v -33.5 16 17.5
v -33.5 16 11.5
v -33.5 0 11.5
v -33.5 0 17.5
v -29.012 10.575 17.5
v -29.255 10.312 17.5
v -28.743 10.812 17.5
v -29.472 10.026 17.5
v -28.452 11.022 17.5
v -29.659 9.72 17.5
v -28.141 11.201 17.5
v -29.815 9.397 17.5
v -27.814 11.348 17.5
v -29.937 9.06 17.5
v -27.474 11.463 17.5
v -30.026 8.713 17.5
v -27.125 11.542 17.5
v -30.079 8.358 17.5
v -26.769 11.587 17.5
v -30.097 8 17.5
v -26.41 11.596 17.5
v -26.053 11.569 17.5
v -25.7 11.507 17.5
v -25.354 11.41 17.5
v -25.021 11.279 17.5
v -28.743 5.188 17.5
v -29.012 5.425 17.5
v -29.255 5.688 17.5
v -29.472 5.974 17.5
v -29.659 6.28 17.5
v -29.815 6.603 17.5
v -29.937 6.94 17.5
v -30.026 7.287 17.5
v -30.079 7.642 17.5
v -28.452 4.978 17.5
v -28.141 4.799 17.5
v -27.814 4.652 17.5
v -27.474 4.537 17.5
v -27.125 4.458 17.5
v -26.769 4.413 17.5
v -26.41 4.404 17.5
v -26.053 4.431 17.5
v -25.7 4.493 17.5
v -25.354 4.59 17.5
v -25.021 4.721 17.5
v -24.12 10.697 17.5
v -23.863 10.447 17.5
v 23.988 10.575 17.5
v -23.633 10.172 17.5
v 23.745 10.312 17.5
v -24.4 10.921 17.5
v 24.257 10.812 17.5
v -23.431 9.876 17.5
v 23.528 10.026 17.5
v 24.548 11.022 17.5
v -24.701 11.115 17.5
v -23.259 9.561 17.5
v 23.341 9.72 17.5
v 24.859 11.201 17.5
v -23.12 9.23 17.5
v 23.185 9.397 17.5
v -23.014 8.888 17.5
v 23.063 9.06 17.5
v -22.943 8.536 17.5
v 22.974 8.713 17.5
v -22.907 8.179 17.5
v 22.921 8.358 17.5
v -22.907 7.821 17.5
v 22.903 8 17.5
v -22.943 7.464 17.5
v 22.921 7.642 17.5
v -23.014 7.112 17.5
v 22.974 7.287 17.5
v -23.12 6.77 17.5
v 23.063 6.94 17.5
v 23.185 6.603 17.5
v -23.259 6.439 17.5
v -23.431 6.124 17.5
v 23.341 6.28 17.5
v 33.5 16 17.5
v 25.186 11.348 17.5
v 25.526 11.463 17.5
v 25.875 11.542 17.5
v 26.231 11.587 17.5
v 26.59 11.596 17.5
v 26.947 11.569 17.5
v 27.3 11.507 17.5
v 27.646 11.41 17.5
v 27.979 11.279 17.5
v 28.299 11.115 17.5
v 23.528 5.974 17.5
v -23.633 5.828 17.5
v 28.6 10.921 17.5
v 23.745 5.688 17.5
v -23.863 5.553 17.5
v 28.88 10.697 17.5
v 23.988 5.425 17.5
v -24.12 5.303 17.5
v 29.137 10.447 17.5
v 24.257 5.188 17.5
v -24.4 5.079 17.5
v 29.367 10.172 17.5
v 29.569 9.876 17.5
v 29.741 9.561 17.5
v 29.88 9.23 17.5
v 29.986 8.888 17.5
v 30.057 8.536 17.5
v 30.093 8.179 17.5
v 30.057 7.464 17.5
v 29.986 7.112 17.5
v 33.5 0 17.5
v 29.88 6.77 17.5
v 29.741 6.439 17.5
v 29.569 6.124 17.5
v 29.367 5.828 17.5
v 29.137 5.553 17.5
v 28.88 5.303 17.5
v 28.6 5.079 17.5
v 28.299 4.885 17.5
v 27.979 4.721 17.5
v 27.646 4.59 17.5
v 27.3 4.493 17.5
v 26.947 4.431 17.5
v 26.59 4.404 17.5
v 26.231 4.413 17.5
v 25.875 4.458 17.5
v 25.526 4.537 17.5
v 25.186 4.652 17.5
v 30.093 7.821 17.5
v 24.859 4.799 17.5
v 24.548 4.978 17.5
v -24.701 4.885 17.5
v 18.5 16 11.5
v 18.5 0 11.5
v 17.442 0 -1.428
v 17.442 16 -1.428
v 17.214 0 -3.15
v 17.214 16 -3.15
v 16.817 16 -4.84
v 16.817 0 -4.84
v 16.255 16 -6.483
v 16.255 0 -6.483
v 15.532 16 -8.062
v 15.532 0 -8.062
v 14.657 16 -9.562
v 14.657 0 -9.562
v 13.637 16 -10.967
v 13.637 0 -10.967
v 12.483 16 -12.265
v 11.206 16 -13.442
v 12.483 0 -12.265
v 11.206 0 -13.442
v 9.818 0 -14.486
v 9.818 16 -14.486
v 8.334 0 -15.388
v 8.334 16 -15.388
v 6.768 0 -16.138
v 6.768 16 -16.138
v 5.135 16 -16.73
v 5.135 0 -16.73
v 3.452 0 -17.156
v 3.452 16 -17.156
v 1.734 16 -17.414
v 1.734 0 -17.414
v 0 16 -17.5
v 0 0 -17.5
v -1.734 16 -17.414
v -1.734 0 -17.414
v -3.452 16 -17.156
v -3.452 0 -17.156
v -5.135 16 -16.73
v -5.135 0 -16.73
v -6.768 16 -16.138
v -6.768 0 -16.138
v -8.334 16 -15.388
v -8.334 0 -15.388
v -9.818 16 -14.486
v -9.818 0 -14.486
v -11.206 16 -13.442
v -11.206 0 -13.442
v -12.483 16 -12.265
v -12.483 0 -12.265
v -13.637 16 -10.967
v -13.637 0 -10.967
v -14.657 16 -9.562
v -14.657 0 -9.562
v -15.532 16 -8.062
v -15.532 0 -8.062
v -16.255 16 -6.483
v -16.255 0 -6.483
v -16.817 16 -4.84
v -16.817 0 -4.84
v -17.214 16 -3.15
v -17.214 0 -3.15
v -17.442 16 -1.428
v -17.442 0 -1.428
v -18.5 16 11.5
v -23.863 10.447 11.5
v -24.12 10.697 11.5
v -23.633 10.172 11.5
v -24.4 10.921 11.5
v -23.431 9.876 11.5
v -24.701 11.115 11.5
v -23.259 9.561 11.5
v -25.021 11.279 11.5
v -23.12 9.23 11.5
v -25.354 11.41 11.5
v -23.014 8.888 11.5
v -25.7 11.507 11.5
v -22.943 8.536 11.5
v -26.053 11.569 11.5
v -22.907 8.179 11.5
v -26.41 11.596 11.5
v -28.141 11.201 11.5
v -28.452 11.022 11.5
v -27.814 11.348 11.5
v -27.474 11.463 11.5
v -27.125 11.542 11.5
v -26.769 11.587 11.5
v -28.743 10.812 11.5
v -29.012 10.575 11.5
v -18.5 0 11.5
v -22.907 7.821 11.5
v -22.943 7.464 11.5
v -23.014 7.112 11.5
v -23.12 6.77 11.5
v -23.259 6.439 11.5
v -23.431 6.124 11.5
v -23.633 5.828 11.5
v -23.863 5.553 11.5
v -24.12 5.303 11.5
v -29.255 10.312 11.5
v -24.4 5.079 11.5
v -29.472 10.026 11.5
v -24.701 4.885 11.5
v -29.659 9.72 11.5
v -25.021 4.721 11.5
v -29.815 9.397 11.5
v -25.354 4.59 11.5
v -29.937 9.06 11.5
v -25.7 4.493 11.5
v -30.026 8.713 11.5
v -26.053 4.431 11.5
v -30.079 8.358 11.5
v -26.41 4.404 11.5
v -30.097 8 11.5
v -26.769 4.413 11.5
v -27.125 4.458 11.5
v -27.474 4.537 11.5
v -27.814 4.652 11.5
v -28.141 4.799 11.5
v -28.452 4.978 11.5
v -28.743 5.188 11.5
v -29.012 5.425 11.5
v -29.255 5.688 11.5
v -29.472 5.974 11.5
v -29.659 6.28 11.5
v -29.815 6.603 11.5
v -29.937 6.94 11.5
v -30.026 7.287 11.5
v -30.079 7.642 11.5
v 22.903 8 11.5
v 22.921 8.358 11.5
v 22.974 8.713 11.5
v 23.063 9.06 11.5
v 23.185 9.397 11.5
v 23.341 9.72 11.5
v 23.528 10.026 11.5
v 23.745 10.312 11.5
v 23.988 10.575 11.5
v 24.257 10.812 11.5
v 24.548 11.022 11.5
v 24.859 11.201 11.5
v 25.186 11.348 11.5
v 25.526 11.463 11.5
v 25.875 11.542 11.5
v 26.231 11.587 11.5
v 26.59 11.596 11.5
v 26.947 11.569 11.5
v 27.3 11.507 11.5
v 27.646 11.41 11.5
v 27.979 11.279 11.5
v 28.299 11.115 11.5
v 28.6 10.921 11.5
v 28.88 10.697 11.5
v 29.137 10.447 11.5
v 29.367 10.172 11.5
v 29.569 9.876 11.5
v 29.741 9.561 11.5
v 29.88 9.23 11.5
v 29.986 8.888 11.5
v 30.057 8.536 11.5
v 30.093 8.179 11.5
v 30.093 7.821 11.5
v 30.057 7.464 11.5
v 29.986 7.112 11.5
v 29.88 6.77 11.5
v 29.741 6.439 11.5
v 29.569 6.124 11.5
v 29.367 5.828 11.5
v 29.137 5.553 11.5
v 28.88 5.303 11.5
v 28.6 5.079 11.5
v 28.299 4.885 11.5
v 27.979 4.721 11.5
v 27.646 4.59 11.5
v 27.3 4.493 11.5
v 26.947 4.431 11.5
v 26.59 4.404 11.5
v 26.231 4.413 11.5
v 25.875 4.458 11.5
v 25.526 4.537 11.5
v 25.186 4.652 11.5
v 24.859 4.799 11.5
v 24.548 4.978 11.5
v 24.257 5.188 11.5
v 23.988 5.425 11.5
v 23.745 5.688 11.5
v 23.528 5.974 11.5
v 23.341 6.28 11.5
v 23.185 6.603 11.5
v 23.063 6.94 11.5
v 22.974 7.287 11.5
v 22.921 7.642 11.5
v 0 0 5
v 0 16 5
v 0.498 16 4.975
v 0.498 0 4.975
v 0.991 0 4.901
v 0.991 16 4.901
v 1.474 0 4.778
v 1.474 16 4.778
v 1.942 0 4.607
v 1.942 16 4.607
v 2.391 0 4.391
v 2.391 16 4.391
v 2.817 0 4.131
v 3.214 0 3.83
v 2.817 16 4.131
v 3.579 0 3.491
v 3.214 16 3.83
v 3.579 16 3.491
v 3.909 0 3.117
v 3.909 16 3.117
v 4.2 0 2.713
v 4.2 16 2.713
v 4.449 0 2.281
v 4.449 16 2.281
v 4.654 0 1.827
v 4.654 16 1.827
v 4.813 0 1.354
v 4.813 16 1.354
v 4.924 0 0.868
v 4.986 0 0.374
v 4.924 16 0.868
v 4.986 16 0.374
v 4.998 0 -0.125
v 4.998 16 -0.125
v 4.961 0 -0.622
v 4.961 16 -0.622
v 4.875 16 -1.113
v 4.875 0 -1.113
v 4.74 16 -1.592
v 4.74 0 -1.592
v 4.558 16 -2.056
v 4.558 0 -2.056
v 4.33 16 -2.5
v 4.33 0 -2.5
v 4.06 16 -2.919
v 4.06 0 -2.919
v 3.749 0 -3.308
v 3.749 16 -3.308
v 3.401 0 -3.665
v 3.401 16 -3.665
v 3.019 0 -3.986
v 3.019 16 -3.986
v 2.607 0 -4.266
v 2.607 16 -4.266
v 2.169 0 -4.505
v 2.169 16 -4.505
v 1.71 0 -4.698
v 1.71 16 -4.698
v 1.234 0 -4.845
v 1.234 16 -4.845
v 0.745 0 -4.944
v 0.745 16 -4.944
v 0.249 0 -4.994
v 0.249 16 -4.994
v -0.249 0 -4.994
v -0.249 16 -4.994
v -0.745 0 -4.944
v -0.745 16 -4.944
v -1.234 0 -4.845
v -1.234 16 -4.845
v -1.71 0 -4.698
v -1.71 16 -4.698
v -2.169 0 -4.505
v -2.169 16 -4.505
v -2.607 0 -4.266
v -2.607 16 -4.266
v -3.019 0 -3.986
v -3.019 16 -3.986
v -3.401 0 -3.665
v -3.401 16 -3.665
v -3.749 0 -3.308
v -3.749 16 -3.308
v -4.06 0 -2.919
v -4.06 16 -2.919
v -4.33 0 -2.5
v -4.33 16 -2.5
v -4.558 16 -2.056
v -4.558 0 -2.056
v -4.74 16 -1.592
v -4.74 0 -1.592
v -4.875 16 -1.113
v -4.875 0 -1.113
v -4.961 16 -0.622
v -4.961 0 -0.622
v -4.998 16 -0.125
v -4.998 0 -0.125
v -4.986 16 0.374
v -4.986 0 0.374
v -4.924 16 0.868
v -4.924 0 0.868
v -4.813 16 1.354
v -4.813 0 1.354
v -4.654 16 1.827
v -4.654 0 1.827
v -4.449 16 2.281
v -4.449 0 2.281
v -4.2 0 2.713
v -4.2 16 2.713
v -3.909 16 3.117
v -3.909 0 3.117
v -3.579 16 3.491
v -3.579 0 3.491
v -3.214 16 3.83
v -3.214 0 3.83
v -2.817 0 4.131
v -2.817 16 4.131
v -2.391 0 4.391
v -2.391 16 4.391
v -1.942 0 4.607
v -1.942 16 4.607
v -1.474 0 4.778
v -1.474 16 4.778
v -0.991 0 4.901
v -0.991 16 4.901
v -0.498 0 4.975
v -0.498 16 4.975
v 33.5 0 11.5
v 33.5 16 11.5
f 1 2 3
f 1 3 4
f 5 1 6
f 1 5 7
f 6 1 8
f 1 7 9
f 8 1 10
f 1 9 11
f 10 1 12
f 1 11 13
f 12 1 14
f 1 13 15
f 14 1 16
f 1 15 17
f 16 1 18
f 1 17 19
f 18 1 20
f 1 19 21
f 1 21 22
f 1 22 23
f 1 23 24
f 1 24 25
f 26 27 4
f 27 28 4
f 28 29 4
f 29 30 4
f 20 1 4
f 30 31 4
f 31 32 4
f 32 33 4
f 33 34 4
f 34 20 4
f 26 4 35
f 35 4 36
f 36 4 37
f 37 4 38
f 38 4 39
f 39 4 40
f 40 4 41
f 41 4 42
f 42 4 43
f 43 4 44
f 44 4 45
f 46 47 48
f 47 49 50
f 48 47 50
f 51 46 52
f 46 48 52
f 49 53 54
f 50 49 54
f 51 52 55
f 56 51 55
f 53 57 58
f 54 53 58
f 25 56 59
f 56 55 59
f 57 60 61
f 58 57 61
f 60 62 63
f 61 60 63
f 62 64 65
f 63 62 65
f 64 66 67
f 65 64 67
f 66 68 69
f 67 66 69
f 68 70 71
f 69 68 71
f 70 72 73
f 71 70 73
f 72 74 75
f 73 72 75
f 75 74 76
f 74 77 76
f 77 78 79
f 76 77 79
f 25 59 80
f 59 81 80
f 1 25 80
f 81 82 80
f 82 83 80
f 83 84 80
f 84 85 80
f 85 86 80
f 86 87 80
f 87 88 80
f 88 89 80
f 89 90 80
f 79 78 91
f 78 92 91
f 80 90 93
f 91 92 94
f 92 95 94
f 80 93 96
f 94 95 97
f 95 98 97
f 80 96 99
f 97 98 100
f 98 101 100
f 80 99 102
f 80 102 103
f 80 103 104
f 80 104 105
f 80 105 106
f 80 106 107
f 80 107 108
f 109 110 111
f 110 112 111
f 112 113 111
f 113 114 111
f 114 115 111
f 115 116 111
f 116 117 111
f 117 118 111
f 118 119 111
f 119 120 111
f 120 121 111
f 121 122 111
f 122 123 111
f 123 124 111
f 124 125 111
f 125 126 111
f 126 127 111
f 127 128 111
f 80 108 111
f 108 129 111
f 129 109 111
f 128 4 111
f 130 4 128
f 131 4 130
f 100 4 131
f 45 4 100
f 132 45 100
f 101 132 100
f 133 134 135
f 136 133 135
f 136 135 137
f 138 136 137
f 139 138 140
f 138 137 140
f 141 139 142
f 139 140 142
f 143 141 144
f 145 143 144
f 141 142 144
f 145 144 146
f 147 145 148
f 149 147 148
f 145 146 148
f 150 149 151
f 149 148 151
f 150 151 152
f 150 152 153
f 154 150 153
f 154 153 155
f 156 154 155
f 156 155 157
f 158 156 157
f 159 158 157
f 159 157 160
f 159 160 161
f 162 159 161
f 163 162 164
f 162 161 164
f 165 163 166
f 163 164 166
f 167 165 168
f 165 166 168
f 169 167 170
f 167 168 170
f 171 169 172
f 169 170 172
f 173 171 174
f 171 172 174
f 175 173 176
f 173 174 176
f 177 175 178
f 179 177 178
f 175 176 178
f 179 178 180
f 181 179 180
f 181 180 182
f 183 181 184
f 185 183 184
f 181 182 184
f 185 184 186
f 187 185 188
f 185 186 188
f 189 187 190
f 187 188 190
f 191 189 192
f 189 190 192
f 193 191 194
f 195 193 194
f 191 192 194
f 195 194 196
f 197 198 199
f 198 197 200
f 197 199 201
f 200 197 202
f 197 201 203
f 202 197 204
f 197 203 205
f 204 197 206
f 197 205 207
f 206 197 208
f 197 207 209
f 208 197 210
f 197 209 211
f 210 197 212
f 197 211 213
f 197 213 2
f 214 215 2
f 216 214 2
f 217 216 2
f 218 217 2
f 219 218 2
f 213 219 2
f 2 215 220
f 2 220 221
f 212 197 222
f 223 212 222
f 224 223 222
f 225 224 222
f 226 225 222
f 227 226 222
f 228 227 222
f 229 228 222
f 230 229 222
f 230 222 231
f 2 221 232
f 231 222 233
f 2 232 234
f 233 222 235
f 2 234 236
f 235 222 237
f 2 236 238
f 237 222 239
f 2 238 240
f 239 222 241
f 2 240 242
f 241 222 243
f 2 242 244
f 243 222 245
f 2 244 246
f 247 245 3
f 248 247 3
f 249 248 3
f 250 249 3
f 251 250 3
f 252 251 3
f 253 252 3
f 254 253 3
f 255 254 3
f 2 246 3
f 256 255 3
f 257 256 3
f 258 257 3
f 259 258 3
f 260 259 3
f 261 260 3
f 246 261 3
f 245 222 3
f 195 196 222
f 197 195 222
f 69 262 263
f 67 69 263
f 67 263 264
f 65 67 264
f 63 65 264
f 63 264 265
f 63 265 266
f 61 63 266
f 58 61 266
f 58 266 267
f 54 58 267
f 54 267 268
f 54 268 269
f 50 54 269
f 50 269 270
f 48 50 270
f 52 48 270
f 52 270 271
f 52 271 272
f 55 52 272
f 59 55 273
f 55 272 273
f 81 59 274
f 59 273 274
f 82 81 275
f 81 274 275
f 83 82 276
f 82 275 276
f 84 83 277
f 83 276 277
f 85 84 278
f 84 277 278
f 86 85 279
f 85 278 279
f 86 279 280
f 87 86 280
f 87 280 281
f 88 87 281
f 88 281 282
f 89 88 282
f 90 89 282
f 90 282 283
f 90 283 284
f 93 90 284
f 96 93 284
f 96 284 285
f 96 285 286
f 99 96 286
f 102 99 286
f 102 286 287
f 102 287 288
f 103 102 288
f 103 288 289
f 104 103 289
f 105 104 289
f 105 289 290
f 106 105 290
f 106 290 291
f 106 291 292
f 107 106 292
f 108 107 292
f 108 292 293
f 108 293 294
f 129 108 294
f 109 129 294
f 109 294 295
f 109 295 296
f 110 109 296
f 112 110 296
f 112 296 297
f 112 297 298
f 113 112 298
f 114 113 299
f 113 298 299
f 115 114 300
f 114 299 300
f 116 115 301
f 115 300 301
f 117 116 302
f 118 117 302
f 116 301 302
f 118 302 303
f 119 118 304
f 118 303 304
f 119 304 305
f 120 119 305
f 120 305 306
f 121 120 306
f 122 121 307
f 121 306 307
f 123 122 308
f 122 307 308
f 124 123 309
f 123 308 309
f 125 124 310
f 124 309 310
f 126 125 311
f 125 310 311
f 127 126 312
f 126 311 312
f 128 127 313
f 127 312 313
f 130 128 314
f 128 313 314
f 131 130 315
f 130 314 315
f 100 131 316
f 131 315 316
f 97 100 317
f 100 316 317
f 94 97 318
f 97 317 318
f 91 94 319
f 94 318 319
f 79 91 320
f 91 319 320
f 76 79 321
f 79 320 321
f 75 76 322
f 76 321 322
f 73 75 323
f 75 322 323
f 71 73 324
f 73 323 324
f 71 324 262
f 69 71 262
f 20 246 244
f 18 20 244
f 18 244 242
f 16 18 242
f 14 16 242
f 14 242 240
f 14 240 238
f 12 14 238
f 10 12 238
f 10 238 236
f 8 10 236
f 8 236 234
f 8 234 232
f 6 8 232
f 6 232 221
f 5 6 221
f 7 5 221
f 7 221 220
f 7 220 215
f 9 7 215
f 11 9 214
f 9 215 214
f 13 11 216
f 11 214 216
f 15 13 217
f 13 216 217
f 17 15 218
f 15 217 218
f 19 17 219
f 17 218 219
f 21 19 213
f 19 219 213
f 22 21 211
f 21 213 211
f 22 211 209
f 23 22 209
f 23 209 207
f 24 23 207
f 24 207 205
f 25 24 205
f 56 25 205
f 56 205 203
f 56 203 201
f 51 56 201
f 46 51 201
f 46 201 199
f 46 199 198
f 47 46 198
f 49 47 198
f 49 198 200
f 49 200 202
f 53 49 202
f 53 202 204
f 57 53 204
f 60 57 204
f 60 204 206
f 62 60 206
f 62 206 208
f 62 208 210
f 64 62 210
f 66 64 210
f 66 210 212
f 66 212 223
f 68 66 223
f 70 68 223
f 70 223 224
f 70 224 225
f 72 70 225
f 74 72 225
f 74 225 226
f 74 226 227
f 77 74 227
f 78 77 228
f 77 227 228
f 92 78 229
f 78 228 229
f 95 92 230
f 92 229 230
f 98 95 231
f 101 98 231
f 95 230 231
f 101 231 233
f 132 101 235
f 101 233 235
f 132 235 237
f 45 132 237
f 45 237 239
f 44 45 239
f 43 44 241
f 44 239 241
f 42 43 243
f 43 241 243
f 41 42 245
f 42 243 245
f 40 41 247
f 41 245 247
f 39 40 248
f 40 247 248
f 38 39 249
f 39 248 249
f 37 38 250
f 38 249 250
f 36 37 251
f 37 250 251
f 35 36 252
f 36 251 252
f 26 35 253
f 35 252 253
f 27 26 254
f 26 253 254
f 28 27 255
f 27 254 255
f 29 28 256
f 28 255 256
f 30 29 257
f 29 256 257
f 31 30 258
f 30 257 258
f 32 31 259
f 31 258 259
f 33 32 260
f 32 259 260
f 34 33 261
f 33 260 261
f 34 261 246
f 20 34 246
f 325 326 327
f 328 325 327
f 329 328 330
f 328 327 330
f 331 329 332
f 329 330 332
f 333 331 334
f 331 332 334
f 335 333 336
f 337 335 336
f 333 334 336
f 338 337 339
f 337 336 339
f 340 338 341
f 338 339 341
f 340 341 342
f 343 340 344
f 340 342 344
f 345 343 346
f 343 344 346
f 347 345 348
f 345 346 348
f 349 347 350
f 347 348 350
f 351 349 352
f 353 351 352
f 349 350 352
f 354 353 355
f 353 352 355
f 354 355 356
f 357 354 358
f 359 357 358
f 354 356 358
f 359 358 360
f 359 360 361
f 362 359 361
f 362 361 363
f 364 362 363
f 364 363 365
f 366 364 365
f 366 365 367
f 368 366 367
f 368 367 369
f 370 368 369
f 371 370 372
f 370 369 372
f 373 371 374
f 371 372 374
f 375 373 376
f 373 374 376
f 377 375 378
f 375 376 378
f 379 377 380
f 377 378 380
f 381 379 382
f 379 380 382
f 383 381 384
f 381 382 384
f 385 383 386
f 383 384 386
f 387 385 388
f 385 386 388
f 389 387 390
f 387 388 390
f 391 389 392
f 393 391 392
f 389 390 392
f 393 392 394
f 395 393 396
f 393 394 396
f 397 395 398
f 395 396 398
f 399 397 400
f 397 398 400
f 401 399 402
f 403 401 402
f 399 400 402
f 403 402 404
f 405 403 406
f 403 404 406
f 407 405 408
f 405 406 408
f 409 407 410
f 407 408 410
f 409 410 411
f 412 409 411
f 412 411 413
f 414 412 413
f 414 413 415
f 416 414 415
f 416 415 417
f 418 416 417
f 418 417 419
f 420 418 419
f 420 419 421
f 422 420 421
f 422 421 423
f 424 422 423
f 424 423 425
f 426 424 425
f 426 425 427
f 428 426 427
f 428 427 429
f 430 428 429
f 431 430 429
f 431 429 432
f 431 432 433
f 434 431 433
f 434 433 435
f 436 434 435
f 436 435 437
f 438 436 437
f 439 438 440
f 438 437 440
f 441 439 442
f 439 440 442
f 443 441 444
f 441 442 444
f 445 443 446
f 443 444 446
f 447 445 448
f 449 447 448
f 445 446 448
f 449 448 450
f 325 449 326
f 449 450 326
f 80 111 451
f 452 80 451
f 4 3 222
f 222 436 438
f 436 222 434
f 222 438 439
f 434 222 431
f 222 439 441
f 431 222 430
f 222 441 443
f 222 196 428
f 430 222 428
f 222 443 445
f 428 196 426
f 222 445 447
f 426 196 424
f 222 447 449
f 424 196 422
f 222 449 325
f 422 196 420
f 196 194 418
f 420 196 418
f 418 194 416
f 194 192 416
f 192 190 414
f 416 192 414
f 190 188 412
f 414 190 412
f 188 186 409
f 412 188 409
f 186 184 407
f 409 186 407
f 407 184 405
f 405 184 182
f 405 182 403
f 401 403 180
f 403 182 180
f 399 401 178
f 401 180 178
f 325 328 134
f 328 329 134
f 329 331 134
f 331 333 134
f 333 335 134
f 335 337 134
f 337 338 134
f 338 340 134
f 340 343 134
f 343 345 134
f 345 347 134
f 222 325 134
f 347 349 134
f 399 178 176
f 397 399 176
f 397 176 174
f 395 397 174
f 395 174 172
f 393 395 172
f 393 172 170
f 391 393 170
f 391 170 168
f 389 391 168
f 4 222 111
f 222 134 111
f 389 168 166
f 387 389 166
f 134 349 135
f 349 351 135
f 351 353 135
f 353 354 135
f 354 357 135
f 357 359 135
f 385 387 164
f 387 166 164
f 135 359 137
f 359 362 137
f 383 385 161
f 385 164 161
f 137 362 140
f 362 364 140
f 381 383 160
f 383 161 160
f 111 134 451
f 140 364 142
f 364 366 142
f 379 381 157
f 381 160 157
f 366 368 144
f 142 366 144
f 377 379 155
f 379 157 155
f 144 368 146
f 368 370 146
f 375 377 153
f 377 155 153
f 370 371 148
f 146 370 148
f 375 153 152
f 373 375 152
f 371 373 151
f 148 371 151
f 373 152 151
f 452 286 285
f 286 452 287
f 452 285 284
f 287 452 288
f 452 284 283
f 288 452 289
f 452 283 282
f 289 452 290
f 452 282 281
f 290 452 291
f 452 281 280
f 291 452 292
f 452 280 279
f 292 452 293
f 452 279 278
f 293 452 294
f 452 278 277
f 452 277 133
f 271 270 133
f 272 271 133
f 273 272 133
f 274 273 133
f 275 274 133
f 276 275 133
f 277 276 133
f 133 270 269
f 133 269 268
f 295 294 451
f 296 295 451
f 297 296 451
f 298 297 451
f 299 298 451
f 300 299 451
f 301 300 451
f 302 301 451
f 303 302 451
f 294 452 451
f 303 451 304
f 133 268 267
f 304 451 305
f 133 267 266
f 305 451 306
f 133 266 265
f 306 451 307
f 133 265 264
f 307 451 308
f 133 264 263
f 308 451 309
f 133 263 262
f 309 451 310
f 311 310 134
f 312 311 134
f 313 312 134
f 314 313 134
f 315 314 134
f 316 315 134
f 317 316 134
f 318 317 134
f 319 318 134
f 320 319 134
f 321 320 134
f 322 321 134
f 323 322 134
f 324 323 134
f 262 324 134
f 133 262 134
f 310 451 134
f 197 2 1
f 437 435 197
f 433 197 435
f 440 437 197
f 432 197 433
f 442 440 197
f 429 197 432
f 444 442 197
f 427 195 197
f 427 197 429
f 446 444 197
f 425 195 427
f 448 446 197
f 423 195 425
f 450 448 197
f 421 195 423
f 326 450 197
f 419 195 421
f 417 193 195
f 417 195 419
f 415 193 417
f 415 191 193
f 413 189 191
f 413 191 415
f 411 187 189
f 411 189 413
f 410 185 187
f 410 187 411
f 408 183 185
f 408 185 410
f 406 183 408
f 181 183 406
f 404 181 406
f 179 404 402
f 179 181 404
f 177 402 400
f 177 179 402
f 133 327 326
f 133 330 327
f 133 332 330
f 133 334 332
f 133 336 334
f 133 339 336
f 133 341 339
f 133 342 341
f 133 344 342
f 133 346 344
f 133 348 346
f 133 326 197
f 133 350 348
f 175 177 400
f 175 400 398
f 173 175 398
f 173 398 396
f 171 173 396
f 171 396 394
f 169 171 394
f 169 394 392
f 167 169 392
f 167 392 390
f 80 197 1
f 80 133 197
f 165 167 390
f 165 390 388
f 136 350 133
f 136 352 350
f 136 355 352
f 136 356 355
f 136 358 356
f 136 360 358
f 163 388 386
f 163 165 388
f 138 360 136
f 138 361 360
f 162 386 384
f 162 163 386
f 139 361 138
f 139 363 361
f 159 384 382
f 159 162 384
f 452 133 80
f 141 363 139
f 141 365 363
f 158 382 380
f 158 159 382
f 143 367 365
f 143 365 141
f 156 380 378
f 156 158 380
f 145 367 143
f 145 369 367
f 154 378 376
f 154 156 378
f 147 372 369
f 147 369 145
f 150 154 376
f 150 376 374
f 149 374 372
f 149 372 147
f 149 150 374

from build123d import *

# Parameters (mm, degrees)
SKETCH_1_R          = 17.5
EXTRUDE_1_DEPTH     = 16
SKETCH_2_R          = 5
CUT_EXTRUDE_1_DEPTH = 16
SKETCH_3_R          = 3.597024537
CUT_EXTRUDE_2_DEPTH = 16


with BuildPart() as part:
    # 草图1 → 凸台-拉伸1 (new body)
    with BuildSketch(Plane(origin=(0, 0, 0), x_dir=(1, 0, 0), z_dir=(0, 1, 0))):
        Circle(SKETCH_1_R)
        with BuildLine():
            Line((-33.5, -11.5), (-33.5, -17.5))
            Line((-33.5, -17.5), (-7.2e-08, -17.5))
            ThreePointArc((-7.2e-08, -17.5), (-12.869300221, -11.85879892), (-17.441650698, 1.427872863))
            Line((-17.441650698, 1.427872863), (-18.5, -11.5))
            Line((-18.5, -11.5), (-33.5, -11.5))
        make_face()
        with BuildLine():
            ThreePointArc((17.5, 0), (12.374368645, -12.374368696), (-7.2e-08, -17.5))
            Line((-7.2e-08, -17.5), (33.5, -17.5))
            Line((33.5, -17.5), (33.5, -11.5))
            Line((33.5, -11.5), (18.5, -11.5))
            Line((18.5, -11.5), (17.441650698, 1.427872863))
            ThreePointArc((17.441650698, 1.427872863), (17.48540659, 0.714532286), (17.5, 0))
        make_face()
    extrude(amount=EXTRUDE_1_DEPTH)

    # 草图2 → 切除-拉伸1 (cut)
    with BuildSketch(Plane(origin=(0, 16, 0), x_dir=(1, 0, 0), z_dir=(0, 1, 0))):
        with Locations(Location((0, 0, 0), (0, 0, 270))):
            Circle(SKETCH_2_R)
    extrude(amount=-CUT_EXTRUDE_1_DEPTH, mode=Mode.SUBTRACT)

    # 草图3 → 切除-拉伸2 (cut)
    with BuildSketch(Plane(origin=(0, 0, 11.5), x_dir=(-1, 0, 0), z_dir=(0, 0, -1))):
        with Locations((-26.5, 8)):
            Circle(SKETCH_3_R)
        with Locations((26.5, 8)):
            Circle(SKETCH_3_R)
    extrude(amount=-CUT_EXTRUDE_2_DEPTH, mode=Mode.SUBTRACT)


solid = part.part
